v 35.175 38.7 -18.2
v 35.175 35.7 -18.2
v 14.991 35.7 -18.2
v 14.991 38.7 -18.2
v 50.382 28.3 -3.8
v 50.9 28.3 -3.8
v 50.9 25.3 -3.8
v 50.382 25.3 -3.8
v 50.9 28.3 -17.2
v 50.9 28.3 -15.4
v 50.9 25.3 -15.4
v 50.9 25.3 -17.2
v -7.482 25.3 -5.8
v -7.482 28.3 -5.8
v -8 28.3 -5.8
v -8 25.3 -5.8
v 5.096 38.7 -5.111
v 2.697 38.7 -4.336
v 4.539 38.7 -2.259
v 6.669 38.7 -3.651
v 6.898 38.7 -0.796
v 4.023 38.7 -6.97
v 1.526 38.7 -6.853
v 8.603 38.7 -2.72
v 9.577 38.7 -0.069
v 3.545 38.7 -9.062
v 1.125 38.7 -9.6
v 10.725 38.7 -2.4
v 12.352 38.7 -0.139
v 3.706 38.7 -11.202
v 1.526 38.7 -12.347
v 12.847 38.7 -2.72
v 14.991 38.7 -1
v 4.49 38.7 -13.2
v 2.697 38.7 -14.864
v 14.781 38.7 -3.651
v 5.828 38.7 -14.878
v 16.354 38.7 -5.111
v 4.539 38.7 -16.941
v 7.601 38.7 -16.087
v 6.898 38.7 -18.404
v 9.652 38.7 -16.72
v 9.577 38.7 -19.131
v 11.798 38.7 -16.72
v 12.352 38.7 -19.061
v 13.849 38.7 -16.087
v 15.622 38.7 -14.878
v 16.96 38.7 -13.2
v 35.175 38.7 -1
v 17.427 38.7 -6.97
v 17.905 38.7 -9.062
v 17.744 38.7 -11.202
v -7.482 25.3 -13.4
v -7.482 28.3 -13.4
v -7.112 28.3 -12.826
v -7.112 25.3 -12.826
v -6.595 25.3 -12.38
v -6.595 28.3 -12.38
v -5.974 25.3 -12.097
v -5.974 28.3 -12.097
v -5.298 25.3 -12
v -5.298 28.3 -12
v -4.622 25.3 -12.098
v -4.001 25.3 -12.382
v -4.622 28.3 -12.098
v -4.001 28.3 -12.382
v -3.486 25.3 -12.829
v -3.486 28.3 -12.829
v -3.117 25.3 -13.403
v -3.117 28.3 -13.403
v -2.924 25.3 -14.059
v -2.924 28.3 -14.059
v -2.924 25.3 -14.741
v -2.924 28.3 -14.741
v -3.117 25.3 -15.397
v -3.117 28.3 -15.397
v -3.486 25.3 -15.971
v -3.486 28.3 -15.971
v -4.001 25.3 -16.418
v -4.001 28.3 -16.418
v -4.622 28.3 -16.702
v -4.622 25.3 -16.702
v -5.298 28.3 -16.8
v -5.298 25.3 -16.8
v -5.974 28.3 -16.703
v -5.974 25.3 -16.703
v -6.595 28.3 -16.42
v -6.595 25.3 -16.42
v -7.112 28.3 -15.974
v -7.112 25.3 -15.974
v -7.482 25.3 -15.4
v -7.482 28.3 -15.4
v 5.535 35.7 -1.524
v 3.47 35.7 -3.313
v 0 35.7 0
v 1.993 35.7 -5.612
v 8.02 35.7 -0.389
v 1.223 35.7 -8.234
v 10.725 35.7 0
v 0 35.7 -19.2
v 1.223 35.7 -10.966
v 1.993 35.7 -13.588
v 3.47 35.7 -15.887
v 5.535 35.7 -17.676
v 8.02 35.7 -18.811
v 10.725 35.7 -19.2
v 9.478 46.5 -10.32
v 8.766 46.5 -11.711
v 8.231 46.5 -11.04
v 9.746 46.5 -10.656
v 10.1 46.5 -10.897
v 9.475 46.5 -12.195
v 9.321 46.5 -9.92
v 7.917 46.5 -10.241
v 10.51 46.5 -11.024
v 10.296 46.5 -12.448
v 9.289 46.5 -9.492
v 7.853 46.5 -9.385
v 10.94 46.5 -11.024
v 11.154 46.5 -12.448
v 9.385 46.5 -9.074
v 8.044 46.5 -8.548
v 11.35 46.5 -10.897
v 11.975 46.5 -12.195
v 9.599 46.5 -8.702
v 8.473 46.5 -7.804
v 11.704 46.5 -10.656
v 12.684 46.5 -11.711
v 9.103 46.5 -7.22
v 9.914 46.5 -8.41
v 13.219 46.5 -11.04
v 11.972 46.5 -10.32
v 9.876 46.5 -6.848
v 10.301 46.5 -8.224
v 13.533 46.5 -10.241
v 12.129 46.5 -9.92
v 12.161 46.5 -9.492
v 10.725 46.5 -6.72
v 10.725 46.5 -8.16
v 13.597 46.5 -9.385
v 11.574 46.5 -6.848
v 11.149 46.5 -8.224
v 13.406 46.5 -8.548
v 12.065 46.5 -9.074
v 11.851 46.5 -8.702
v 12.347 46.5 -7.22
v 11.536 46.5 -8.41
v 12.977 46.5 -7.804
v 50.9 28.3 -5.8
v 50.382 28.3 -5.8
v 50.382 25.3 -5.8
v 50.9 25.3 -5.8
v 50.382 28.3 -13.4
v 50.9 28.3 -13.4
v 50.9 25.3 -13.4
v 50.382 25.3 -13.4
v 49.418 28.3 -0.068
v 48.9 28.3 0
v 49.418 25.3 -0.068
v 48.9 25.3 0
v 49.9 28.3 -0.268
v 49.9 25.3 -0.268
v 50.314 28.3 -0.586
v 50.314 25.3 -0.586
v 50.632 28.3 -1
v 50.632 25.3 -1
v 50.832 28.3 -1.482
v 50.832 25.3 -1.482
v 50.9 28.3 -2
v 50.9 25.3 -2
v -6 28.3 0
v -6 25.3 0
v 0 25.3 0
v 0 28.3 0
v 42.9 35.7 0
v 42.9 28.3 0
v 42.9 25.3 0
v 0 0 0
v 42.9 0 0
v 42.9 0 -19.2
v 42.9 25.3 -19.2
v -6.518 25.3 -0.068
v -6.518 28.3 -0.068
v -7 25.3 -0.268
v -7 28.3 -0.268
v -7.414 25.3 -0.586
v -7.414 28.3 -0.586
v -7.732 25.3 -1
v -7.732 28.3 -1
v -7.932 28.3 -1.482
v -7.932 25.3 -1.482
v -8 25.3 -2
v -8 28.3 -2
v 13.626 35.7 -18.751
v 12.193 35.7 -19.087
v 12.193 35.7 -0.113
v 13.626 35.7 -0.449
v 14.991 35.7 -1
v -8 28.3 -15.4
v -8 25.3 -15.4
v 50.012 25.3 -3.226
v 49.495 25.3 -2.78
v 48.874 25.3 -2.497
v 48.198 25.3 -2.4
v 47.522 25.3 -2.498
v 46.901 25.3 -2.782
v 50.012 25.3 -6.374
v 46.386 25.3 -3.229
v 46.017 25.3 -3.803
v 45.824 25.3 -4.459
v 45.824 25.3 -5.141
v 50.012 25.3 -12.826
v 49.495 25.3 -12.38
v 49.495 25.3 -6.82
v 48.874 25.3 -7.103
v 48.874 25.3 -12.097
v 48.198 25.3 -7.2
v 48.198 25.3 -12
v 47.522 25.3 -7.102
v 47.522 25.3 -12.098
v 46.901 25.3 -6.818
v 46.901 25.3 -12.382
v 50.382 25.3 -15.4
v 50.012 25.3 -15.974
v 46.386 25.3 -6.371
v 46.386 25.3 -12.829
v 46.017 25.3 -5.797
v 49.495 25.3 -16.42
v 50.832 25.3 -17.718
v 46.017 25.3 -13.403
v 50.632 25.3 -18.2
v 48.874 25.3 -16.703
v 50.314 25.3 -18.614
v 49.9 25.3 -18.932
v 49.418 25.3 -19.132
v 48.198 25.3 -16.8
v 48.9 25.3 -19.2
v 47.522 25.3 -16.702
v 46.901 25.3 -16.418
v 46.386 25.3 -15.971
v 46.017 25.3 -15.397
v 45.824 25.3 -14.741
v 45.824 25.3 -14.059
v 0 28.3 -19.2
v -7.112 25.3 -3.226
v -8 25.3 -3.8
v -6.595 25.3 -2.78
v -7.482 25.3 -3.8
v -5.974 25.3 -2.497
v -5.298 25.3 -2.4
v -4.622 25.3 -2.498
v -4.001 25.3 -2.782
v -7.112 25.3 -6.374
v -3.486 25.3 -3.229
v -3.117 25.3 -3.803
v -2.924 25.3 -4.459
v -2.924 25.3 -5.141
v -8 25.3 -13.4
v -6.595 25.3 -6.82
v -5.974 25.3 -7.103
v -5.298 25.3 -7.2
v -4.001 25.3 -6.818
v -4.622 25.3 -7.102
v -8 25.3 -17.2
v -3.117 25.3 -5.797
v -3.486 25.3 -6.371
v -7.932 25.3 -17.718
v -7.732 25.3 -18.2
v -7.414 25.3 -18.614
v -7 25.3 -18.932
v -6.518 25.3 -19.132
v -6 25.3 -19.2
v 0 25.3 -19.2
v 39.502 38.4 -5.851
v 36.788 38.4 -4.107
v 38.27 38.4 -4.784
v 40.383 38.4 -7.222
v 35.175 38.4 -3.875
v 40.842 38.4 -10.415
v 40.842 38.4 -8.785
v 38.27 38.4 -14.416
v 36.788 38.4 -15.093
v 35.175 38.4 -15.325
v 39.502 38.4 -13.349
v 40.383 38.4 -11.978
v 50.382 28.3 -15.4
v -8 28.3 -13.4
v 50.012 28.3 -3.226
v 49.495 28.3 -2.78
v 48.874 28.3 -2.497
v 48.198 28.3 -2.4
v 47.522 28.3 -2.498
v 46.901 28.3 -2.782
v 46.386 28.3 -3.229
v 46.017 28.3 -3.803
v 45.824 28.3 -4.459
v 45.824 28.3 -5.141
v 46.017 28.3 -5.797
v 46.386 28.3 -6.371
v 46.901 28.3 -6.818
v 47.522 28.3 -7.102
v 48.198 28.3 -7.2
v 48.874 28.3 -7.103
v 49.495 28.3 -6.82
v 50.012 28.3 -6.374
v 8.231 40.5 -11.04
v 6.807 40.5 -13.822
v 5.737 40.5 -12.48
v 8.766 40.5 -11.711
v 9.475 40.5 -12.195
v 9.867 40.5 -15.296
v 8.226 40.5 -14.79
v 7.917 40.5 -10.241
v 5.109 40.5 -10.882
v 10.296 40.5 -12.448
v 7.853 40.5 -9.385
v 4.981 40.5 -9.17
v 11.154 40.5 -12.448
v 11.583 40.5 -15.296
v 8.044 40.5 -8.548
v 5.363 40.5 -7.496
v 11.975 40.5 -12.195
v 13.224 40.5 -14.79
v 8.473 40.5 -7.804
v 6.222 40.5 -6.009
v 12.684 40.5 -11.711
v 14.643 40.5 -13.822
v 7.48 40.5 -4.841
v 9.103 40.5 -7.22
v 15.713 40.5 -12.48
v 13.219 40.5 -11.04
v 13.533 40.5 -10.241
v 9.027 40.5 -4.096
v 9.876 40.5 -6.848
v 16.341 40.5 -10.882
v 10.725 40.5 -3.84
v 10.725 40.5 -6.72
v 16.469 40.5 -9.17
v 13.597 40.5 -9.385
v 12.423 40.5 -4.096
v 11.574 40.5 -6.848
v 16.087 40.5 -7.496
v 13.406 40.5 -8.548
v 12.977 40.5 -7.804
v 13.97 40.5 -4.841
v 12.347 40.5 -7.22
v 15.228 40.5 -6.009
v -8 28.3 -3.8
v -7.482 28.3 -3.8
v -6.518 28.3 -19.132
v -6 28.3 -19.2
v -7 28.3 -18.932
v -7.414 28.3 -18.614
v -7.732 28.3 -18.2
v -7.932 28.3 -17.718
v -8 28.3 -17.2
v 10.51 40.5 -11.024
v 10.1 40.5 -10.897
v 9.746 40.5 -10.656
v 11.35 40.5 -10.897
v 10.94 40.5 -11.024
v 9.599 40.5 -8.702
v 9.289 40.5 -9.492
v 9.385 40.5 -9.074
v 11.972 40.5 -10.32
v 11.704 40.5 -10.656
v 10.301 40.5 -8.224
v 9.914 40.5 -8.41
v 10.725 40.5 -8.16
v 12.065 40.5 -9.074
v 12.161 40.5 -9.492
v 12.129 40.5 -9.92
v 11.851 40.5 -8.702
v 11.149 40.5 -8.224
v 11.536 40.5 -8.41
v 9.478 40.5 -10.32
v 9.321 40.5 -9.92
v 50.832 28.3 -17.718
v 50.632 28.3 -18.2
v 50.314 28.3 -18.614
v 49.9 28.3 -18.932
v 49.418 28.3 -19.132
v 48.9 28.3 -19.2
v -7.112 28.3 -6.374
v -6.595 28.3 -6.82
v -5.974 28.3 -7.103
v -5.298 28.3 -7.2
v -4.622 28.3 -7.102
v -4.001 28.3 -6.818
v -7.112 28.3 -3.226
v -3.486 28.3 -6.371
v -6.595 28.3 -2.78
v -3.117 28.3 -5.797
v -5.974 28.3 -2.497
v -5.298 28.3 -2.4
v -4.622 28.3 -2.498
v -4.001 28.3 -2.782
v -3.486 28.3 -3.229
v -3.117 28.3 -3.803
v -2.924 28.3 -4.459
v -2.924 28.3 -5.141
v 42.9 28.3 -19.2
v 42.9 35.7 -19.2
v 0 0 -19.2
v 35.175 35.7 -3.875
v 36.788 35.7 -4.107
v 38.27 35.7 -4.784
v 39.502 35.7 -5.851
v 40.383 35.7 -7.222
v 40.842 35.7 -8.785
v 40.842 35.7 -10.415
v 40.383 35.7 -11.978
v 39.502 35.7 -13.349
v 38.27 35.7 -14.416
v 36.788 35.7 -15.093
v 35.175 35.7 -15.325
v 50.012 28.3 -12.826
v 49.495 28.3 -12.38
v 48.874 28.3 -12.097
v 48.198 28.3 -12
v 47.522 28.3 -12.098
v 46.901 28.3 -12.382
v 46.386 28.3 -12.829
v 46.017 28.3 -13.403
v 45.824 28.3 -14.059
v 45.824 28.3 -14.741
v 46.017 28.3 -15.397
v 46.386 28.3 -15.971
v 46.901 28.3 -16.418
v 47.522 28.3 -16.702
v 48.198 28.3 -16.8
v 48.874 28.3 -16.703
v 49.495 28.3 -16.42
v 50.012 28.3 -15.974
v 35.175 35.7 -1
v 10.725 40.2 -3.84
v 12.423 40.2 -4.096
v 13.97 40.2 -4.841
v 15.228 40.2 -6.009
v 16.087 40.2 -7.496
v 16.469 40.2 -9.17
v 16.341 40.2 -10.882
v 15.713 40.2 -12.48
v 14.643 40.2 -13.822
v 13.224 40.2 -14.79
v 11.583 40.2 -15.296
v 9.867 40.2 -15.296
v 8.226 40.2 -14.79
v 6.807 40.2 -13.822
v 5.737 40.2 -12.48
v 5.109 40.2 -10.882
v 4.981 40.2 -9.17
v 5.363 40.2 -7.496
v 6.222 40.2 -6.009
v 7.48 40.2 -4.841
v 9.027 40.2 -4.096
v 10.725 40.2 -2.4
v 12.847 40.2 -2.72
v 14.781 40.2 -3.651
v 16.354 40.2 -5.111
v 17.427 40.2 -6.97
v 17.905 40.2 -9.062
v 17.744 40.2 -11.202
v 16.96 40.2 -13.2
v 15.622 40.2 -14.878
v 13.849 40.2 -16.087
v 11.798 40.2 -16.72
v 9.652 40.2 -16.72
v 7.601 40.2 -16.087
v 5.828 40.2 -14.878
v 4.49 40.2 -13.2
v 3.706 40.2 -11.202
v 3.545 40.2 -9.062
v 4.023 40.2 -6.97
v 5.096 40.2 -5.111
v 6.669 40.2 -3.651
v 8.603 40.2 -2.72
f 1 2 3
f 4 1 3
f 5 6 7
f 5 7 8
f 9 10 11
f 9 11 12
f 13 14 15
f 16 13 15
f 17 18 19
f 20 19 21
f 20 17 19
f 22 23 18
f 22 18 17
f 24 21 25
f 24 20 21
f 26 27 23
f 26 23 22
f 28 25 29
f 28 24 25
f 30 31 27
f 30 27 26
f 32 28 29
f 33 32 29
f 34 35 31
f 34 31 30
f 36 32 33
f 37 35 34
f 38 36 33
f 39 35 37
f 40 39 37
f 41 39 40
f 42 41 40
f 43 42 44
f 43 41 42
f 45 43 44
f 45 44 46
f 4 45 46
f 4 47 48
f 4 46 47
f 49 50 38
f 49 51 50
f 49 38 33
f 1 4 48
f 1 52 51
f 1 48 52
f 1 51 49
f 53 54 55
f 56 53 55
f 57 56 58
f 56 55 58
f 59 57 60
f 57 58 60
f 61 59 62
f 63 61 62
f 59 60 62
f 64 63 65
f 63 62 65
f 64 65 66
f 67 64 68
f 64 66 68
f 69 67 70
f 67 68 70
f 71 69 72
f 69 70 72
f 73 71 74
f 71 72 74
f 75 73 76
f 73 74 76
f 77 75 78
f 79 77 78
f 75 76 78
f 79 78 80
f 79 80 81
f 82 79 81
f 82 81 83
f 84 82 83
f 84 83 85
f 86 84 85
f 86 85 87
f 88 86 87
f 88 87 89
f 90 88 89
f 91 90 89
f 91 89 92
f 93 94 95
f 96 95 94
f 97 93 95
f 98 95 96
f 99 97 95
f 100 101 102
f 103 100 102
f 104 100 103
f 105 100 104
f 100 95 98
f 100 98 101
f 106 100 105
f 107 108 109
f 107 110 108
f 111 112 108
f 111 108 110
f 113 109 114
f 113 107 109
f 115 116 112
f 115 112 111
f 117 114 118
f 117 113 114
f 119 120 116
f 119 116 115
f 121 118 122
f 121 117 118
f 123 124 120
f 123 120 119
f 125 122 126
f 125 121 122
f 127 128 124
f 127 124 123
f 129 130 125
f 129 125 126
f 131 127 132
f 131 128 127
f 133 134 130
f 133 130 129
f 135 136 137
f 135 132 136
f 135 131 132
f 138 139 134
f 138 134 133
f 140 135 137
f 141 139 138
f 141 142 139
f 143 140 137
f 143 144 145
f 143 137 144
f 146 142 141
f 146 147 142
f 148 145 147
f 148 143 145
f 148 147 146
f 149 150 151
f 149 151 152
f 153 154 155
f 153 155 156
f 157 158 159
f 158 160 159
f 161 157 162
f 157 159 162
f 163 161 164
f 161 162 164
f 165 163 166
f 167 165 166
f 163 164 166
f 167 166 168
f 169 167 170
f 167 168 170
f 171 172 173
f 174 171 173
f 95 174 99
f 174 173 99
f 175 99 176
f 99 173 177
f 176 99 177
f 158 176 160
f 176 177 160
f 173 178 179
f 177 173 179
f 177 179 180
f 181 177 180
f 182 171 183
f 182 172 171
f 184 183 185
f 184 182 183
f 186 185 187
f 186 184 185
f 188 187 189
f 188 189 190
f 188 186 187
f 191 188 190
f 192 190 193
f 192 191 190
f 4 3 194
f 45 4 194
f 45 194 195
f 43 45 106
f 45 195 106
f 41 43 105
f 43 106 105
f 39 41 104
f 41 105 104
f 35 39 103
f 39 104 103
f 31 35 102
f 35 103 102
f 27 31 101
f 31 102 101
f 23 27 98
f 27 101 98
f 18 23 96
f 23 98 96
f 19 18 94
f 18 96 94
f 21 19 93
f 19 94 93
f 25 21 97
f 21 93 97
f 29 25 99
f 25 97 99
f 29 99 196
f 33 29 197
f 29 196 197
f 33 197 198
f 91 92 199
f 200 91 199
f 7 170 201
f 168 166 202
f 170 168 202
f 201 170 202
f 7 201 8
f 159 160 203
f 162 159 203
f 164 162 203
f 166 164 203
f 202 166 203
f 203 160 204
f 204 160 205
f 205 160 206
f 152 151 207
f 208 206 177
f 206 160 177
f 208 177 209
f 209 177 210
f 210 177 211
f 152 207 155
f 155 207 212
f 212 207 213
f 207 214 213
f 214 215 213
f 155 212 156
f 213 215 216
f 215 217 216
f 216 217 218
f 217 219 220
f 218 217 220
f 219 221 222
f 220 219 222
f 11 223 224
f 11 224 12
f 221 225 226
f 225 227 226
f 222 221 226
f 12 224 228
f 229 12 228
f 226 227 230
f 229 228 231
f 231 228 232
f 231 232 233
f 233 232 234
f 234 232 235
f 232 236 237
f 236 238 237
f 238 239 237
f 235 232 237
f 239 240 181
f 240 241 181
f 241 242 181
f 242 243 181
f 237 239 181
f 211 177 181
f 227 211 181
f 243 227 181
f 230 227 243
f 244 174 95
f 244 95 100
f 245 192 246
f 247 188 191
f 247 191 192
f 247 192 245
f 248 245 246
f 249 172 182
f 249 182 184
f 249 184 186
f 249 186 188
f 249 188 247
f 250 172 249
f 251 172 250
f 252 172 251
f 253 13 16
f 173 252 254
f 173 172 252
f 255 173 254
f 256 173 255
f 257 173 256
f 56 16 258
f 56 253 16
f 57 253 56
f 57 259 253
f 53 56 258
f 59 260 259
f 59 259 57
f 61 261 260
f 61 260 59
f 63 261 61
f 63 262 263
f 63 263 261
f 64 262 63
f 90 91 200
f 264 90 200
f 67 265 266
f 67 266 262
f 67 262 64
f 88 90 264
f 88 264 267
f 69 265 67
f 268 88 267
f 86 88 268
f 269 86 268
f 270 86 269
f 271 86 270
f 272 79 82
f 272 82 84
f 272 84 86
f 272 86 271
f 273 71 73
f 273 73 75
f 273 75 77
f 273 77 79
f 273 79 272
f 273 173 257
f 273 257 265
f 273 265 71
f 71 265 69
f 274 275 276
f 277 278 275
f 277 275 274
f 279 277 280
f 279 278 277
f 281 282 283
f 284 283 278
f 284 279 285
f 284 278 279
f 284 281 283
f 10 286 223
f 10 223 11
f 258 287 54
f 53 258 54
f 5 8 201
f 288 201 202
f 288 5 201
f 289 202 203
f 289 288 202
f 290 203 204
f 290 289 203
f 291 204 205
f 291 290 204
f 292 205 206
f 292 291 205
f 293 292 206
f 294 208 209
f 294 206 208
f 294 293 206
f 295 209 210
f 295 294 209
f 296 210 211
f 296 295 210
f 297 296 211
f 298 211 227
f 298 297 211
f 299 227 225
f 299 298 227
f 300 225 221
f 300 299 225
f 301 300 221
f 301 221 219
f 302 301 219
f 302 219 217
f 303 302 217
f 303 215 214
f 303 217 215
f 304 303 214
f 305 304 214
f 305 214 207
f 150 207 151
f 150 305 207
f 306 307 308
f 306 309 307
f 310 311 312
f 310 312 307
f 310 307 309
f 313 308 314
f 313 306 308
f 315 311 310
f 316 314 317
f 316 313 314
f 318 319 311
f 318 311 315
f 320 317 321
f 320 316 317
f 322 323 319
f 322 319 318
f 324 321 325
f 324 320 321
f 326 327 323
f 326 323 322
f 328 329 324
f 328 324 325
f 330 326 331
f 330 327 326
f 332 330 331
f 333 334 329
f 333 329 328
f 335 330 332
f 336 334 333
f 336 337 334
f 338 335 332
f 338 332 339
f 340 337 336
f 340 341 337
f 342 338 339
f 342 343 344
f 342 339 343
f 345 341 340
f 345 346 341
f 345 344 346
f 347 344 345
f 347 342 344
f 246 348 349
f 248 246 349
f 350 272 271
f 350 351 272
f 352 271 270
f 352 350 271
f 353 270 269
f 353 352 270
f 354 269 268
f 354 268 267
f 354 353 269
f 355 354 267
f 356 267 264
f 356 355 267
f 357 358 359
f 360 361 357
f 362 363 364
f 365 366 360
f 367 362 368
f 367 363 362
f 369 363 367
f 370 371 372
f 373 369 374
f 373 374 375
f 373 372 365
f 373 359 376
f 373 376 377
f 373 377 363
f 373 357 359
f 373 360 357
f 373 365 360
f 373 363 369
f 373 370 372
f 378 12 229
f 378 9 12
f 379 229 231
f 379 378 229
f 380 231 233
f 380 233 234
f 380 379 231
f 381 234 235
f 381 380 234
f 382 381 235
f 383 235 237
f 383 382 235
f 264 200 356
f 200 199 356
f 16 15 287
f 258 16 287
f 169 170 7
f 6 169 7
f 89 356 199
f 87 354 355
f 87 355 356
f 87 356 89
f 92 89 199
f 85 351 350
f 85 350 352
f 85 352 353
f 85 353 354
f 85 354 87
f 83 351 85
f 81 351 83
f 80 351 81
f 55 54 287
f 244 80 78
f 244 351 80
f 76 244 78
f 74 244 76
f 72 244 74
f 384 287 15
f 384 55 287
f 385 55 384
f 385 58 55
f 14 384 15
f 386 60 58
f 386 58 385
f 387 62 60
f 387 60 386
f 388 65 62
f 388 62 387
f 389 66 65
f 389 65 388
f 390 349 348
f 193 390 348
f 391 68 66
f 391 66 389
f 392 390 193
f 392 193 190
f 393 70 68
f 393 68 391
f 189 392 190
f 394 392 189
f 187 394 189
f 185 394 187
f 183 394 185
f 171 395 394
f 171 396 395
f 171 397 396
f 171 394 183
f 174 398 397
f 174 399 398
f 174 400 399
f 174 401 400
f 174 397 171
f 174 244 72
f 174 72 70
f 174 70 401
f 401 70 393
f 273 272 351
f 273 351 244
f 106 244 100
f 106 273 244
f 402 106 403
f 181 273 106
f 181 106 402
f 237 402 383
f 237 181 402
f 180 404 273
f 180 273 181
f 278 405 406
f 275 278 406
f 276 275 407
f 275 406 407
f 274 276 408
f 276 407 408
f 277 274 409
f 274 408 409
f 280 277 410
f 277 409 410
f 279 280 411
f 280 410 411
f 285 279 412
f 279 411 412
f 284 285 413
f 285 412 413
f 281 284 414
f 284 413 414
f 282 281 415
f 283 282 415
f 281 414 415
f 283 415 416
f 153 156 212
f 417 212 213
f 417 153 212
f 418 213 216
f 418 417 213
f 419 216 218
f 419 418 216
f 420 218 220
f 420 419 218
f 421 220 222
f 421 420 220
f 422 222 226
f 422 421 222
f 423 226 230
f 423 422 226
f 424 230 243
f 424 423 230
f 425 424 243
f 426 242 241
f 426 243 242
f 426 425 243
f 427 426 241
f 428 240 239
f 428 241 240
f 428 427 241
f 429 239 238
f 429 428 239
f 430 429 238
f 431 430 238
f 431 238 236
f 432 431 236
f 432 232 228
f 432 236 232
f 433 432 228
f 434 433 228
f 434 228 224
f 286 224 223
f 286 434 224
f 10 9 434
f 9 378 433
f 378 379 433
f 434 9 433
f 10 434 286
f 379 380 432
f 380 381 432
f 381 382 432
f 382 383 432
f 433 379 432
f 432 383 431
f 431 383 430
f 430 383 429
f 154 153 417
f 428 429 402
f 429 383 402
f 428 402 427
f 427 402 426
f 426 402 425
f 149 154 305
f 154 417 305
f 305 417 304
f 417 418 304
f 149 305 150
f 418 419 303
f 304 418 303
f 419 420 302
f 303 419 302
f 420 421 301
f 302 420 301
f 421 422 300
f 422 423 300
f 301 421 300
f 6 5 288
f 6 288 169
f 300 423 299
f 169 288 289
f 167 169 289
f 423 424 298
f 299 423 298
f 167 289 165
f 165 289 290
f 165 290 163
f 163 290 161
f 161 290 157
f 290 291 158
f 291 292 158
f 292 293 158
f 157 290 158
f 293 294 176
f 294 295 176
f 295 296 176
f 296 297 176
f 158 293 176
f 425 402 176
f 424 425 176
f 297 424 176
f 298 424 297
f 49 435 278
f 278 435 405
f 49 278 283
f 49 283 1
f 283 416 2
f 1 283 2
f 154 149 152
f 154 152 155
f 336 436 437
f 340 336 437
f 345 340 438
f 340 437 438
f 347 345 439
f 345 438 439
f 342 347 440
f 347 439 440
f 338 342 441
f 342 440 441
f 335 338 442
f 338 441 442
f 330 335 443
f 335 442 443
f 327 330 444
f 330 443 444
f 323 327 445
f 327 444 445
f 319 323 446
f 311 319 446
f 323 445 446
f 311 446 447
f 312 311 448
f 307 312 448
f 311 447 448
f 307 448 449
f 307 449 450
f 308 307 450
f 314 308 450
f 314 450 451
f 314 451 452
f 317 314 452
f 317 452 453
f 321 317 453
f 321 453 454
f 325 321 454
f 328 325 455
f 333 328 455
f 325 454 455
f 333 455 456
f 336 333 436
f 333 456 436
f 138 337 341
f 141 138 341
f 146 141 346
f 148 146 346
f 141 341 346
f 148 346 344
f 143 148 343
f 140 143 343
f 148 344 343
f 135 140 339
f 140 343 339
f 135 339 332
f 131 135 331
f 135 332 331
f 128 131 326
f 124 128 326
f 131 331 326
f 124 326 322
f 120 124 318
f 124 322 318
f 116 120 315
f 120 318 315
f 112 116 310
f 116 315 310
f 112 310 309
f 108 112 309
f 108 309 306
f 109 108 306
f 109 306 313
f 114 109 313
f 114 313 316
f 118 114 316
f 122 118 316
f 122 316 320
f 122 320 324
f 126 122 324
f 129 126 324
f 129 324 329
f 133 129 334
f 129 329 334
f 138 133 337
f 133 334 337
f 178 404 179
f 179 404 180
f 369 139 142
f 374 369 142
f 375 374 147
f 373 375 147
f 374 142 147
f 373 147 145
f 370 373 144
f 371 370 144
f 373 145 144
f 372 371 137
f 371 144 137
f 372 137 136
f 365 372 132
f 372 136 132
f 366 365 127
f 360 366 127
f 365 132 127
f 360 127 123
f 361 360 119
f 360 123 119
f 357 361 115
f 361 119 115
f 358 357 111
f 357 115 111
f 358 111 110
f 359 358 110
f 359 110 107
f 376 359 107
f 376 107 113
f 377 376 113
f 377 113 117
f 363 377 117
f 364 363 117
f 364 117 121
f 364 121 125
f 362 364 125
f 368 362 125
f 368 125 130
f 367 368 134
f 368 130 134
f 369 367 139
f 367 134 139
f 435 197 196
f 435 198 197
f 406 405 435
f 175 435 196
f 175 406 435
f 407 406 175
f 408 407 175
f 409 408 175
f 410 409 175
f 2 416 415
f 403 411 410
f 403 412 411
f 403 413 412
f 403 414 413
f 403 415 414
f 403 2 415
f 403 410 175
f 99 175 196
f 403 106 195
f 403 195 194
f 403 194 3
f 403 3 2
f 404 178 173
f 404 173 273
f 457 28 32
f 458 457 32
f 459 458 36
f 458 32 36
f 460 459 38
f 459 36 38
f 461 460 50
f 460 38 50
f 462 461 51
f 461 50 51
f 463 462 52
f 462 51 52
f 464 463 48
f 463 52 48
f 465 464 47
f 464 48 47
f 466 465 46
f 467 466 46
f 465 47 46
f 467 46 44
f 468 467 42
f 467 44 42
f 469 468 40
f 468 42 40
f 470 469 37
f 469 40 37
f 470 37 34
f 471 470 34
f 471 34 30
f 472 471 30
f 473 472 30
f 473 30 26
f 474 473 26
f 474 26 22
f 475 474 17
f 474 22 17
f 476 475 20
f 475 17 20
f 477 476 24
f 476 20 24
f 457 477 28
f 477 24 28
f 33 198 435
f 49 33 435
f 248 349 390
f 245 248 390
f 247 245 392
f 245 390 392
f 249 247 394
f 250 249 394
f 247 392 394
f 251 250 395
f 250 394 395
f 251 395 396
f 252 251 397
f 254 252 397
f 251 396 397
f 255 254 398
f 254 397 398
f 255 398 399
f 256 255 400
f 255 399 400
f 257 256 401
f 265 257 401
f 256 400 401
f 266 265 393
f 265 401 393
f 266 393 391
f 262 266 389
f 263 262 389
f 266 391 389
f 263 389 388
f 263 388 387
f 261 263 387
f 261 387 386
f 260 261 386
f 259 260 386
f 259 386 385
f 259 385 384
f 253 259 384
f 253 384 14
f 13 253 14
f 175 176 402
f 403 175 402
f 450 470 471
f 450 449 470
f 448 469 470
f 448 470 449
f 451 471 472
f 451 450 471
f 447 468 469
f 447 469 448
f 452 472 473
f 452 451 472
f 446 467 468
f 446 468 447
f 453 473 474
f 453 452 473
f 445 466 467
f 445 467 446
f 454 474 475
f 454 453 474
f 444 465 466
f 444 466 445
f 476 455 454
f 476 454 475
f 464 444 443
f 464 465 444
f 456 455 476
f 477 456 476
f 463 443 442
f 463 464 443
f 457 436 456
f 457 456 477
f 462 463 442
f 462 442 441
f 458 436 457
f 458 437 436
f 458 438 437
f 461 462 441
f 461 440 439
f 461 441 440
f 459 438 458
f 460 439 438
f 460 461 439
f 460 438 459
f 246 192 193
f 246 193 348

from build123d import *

# Parameters (mm, degrees)
SKETCH_1_W             = 42.9
SKETCH_1_H             = 19.2
EXTRUDE_1_DEPTH        = 35.7
EXTRUDE_3_DEPTH        = 3
SKETCH_5_R             = 7.2
EXTRUDE_4_DEPTH        = 1.5
SKETCH_6_R             = 5.76
EXTRUDE_5_DEPTH        = 0.3
CUT_EXTRUDE_START      = -0.3
CUT_EXTRUDE_3_DEPTH    = 0.3
EXTRUDE_6_DEPTH        = 8
FILLET_1_R             = 2
FILLET_2_R             = 2
CUT_EXTRUDE_4_DEPTH    = 62.321611199
FILLET_1_OF_MIRROR_2_R = 2
FILLET_2_OF_MIRROR_2_R = 2
SKETCH_10_R            = 2.88
EXTRUDE_7_DEPTH        = 6
SKETCH_11_R            = 1.44
CUT_EXTRUDE_5_DEPTH    = 6


with BuildPart() as part:
    # Эскиз1 → Бобышка-Вытянуть1 (new body)
    with BuildSketch(Plane(origin=(0, 0, 0), x_dir=(1, 0, 0), z_dir=(0, 1, 0))):
        with Locations((21.45, 9.6)):
            Rectangle(SKETCH_1_W, SKETCH_1_H)
    extrude(amount=EXTRUDE_1_DEPTH)

    # Эскиз2 → Бобышка-Вытянуть3 (add)
    with BuildSketch(Plane(origin=(0, 35.7, 0), x_dir=(1, 0, 0), z_dir=(0, 1, 0))):
        with BuildLine():
            Line((14.991145802, 1), (35.175, 1))
            Line((35.175, 1), (35.175, 3.875))
            ThreePointArc((35.175, 3.875), (40.9, 9.6), (35.175, 15.325))
            Line((35.175, 15.325), (35.175, 18.2))
            Line((35.175, 18.2), (14.991145802, 18.2))
            ThreePointArc((14.991145802, 18.2), (1.125, 9.6), (14.991145802, 1))
        make_face()
    extrude(amount=EXTRUDE_3_DEPTH)

    # Эскиз5 → Бобышка-Вытянуть4 (add)
    with BuildSketch(Plane(origin=(0, 38.7, 0), x_dir=(1, 0, 0), z_dir=(0, 1, 0))):
        with Locations((10.725, 9.6)):
            Circle(SKETCH_5_R)
    extrude(amount=EXTRUDE_4_DEPTH)

    # Эскиз6 → Бобышка-Вытянуть5 (add)
    with BuildSketch(Plane(origin=(0, 40.2, 0), x_dir=(1, 0, 0), z_dir=(0, 1, 0))):
        with Locations((10.725, 9.6)):
            Circle(SKETCH_6_R)
    extrude(amount=EXTRUDE_5_DEPTH)

    # Эскиз4 → Вырез-Вытянуть3 (cut)
    with BuildSketch(Plane(origin=(0, 38.7, 0), x_dir=(1, 0, 0), z_dir=(0, 1, 0)).offset(CUT_EXTRUDE_START)):
        with BuildLine():
            Line((35.175, 15.325), (35.175, 3.875))
            ThreePointArc((35.175, 3.875), (40.9, 9.6), (35.175, 15.325))
        make_face()
    extrude(amount=CUT_EXTRUDE_3_DEPTH, mode=Mode.SUBTRACT)

    # Эскиз8 → Бобышка-Вытянуть6 (add)
    with BuildSketch(Plane(origin=(42.9, 0, 0), x_dir=(0, 0, -1), z_dir=(1, 0, 0))):
        Polygon((19.2, 26.8), (19.2, 28.3), (0, 28.3), (0, 25.3), (19.2, 25.3), align=None)
    extrude_6 = extrude(amount=EXTRUDE_6_DEPTH)

    # Скругление1
    fillet_1_edges = [part.edges().sort_by_distance(p)[0] for p in [
        (50.9, 26.8, 0),
    ]]
    fillet(fillet_1_edges, radius=FILLET_1_R)

    # Скругление2
    fillet_2_edges = [part.edges().sort_by_distance(p)[0] for p in [
        (50.9, 26.8, -19.2),
    ]]
    fillet(fillet_2_edges, radius=FILLET_2_R)

    # Эскиз9 → Вырез-Вытянуть4 (cut, through all)
    with BuildSketch(Plane(origin=(0, 28.3, 0), x_dir=(1, 0, 0), z_dir=(0, 1, 0))):
        with BuildLine():
            Line((50.381742423, 5.8), (50.9, 5.8))
            Line((50.9, 5.8), (50.9, 3.8))
            Line((50.9, 3.8), (50.381742423, 3.8))
            ThreePointArc((50.381742423, 3.8), (45.8, 4.8), (50.381742423, 5.8))
        make_face()
        with BuildLine():
            Line((50.381742423, 15.4), (50.9, 15.4))
            Line((50.9, 15.4), (50.9, 13.4))
            Line((50.9, 13.4), (50.381742423, 13.4))
            ThreePointArc((50.381742423, 13.4), (45.8, 14.4), (50.381742423, 15.4))
        make_face()
    cut_extrude_4 = extrude(amount=-CUT_EXTRUDE_4_DEPTH, mode=Mode.SUBTRACT)

    # Зеркальное отражение2: Бобышка-Вытянуть6, Вырез-Вытянуть4 across plane
    add(extrude_6.mirror(Plane(origin=(21.45, 0, 0), x_dir=(0, 0, 1), z_dir=(1, 0, 0))))
    add(cut_extrude_4.mirror(Plane(origin=(21.45, 0, 0), x_dir=(0, 0, 1), z_dir=(1, 0, 0))), mode=Mode.SUBTRACT)

    # Скругление1 of Зеркальное отражение2
    fillet_1_of_mirror_2_edges = [part.edges().sort_by_distance(p)[0] for p in [
        (-8, 26.8, 0),
    ]]
    fillet(fillet_1_of_mirror_2_edges, radius=FILLET_1_OF_MIRROR_2_R)

    # Скругление2 of Зеркальное отражение2
    fillet_2_of_mirror_2_edges = [part.edges().sort_by_distance(p)[0] for p in [
        (-8, 26.8, -19.2),
    ]]
    fillet(fillet_2_of_mirror_2_edges, radius=FILLET_2_OF_MIRROR_2_R)

    # Эскиз10 → Бобышка-Вытянуть7 (add)
    with BuildSketch(Plane(origin=(0, 40.5, 0), x_dir=(1, 0, 0), z_dir=(0, 1, 0))):
        with Locations((10.725, 9.6)):
            Circle(SKETCH_10_R)
    extrude(amount=EXTRUDE_7_DEPTH)

    # Эскиз11 → Вырез-Вытянуть5 (cut)
    with BuildSketch(Plane(origin=(0, 46.5, 0), x_dir=(1, 0, 0), z_dir=(0, 1, 0))):
        with Locations((10.725, 9.6)):
            Circle(SKETCH_11_R)
    extrude(amount=-CUT_EXTRUDE_5_DEPTH, mode=Mode.SUBTRACT)


solid = part.part
